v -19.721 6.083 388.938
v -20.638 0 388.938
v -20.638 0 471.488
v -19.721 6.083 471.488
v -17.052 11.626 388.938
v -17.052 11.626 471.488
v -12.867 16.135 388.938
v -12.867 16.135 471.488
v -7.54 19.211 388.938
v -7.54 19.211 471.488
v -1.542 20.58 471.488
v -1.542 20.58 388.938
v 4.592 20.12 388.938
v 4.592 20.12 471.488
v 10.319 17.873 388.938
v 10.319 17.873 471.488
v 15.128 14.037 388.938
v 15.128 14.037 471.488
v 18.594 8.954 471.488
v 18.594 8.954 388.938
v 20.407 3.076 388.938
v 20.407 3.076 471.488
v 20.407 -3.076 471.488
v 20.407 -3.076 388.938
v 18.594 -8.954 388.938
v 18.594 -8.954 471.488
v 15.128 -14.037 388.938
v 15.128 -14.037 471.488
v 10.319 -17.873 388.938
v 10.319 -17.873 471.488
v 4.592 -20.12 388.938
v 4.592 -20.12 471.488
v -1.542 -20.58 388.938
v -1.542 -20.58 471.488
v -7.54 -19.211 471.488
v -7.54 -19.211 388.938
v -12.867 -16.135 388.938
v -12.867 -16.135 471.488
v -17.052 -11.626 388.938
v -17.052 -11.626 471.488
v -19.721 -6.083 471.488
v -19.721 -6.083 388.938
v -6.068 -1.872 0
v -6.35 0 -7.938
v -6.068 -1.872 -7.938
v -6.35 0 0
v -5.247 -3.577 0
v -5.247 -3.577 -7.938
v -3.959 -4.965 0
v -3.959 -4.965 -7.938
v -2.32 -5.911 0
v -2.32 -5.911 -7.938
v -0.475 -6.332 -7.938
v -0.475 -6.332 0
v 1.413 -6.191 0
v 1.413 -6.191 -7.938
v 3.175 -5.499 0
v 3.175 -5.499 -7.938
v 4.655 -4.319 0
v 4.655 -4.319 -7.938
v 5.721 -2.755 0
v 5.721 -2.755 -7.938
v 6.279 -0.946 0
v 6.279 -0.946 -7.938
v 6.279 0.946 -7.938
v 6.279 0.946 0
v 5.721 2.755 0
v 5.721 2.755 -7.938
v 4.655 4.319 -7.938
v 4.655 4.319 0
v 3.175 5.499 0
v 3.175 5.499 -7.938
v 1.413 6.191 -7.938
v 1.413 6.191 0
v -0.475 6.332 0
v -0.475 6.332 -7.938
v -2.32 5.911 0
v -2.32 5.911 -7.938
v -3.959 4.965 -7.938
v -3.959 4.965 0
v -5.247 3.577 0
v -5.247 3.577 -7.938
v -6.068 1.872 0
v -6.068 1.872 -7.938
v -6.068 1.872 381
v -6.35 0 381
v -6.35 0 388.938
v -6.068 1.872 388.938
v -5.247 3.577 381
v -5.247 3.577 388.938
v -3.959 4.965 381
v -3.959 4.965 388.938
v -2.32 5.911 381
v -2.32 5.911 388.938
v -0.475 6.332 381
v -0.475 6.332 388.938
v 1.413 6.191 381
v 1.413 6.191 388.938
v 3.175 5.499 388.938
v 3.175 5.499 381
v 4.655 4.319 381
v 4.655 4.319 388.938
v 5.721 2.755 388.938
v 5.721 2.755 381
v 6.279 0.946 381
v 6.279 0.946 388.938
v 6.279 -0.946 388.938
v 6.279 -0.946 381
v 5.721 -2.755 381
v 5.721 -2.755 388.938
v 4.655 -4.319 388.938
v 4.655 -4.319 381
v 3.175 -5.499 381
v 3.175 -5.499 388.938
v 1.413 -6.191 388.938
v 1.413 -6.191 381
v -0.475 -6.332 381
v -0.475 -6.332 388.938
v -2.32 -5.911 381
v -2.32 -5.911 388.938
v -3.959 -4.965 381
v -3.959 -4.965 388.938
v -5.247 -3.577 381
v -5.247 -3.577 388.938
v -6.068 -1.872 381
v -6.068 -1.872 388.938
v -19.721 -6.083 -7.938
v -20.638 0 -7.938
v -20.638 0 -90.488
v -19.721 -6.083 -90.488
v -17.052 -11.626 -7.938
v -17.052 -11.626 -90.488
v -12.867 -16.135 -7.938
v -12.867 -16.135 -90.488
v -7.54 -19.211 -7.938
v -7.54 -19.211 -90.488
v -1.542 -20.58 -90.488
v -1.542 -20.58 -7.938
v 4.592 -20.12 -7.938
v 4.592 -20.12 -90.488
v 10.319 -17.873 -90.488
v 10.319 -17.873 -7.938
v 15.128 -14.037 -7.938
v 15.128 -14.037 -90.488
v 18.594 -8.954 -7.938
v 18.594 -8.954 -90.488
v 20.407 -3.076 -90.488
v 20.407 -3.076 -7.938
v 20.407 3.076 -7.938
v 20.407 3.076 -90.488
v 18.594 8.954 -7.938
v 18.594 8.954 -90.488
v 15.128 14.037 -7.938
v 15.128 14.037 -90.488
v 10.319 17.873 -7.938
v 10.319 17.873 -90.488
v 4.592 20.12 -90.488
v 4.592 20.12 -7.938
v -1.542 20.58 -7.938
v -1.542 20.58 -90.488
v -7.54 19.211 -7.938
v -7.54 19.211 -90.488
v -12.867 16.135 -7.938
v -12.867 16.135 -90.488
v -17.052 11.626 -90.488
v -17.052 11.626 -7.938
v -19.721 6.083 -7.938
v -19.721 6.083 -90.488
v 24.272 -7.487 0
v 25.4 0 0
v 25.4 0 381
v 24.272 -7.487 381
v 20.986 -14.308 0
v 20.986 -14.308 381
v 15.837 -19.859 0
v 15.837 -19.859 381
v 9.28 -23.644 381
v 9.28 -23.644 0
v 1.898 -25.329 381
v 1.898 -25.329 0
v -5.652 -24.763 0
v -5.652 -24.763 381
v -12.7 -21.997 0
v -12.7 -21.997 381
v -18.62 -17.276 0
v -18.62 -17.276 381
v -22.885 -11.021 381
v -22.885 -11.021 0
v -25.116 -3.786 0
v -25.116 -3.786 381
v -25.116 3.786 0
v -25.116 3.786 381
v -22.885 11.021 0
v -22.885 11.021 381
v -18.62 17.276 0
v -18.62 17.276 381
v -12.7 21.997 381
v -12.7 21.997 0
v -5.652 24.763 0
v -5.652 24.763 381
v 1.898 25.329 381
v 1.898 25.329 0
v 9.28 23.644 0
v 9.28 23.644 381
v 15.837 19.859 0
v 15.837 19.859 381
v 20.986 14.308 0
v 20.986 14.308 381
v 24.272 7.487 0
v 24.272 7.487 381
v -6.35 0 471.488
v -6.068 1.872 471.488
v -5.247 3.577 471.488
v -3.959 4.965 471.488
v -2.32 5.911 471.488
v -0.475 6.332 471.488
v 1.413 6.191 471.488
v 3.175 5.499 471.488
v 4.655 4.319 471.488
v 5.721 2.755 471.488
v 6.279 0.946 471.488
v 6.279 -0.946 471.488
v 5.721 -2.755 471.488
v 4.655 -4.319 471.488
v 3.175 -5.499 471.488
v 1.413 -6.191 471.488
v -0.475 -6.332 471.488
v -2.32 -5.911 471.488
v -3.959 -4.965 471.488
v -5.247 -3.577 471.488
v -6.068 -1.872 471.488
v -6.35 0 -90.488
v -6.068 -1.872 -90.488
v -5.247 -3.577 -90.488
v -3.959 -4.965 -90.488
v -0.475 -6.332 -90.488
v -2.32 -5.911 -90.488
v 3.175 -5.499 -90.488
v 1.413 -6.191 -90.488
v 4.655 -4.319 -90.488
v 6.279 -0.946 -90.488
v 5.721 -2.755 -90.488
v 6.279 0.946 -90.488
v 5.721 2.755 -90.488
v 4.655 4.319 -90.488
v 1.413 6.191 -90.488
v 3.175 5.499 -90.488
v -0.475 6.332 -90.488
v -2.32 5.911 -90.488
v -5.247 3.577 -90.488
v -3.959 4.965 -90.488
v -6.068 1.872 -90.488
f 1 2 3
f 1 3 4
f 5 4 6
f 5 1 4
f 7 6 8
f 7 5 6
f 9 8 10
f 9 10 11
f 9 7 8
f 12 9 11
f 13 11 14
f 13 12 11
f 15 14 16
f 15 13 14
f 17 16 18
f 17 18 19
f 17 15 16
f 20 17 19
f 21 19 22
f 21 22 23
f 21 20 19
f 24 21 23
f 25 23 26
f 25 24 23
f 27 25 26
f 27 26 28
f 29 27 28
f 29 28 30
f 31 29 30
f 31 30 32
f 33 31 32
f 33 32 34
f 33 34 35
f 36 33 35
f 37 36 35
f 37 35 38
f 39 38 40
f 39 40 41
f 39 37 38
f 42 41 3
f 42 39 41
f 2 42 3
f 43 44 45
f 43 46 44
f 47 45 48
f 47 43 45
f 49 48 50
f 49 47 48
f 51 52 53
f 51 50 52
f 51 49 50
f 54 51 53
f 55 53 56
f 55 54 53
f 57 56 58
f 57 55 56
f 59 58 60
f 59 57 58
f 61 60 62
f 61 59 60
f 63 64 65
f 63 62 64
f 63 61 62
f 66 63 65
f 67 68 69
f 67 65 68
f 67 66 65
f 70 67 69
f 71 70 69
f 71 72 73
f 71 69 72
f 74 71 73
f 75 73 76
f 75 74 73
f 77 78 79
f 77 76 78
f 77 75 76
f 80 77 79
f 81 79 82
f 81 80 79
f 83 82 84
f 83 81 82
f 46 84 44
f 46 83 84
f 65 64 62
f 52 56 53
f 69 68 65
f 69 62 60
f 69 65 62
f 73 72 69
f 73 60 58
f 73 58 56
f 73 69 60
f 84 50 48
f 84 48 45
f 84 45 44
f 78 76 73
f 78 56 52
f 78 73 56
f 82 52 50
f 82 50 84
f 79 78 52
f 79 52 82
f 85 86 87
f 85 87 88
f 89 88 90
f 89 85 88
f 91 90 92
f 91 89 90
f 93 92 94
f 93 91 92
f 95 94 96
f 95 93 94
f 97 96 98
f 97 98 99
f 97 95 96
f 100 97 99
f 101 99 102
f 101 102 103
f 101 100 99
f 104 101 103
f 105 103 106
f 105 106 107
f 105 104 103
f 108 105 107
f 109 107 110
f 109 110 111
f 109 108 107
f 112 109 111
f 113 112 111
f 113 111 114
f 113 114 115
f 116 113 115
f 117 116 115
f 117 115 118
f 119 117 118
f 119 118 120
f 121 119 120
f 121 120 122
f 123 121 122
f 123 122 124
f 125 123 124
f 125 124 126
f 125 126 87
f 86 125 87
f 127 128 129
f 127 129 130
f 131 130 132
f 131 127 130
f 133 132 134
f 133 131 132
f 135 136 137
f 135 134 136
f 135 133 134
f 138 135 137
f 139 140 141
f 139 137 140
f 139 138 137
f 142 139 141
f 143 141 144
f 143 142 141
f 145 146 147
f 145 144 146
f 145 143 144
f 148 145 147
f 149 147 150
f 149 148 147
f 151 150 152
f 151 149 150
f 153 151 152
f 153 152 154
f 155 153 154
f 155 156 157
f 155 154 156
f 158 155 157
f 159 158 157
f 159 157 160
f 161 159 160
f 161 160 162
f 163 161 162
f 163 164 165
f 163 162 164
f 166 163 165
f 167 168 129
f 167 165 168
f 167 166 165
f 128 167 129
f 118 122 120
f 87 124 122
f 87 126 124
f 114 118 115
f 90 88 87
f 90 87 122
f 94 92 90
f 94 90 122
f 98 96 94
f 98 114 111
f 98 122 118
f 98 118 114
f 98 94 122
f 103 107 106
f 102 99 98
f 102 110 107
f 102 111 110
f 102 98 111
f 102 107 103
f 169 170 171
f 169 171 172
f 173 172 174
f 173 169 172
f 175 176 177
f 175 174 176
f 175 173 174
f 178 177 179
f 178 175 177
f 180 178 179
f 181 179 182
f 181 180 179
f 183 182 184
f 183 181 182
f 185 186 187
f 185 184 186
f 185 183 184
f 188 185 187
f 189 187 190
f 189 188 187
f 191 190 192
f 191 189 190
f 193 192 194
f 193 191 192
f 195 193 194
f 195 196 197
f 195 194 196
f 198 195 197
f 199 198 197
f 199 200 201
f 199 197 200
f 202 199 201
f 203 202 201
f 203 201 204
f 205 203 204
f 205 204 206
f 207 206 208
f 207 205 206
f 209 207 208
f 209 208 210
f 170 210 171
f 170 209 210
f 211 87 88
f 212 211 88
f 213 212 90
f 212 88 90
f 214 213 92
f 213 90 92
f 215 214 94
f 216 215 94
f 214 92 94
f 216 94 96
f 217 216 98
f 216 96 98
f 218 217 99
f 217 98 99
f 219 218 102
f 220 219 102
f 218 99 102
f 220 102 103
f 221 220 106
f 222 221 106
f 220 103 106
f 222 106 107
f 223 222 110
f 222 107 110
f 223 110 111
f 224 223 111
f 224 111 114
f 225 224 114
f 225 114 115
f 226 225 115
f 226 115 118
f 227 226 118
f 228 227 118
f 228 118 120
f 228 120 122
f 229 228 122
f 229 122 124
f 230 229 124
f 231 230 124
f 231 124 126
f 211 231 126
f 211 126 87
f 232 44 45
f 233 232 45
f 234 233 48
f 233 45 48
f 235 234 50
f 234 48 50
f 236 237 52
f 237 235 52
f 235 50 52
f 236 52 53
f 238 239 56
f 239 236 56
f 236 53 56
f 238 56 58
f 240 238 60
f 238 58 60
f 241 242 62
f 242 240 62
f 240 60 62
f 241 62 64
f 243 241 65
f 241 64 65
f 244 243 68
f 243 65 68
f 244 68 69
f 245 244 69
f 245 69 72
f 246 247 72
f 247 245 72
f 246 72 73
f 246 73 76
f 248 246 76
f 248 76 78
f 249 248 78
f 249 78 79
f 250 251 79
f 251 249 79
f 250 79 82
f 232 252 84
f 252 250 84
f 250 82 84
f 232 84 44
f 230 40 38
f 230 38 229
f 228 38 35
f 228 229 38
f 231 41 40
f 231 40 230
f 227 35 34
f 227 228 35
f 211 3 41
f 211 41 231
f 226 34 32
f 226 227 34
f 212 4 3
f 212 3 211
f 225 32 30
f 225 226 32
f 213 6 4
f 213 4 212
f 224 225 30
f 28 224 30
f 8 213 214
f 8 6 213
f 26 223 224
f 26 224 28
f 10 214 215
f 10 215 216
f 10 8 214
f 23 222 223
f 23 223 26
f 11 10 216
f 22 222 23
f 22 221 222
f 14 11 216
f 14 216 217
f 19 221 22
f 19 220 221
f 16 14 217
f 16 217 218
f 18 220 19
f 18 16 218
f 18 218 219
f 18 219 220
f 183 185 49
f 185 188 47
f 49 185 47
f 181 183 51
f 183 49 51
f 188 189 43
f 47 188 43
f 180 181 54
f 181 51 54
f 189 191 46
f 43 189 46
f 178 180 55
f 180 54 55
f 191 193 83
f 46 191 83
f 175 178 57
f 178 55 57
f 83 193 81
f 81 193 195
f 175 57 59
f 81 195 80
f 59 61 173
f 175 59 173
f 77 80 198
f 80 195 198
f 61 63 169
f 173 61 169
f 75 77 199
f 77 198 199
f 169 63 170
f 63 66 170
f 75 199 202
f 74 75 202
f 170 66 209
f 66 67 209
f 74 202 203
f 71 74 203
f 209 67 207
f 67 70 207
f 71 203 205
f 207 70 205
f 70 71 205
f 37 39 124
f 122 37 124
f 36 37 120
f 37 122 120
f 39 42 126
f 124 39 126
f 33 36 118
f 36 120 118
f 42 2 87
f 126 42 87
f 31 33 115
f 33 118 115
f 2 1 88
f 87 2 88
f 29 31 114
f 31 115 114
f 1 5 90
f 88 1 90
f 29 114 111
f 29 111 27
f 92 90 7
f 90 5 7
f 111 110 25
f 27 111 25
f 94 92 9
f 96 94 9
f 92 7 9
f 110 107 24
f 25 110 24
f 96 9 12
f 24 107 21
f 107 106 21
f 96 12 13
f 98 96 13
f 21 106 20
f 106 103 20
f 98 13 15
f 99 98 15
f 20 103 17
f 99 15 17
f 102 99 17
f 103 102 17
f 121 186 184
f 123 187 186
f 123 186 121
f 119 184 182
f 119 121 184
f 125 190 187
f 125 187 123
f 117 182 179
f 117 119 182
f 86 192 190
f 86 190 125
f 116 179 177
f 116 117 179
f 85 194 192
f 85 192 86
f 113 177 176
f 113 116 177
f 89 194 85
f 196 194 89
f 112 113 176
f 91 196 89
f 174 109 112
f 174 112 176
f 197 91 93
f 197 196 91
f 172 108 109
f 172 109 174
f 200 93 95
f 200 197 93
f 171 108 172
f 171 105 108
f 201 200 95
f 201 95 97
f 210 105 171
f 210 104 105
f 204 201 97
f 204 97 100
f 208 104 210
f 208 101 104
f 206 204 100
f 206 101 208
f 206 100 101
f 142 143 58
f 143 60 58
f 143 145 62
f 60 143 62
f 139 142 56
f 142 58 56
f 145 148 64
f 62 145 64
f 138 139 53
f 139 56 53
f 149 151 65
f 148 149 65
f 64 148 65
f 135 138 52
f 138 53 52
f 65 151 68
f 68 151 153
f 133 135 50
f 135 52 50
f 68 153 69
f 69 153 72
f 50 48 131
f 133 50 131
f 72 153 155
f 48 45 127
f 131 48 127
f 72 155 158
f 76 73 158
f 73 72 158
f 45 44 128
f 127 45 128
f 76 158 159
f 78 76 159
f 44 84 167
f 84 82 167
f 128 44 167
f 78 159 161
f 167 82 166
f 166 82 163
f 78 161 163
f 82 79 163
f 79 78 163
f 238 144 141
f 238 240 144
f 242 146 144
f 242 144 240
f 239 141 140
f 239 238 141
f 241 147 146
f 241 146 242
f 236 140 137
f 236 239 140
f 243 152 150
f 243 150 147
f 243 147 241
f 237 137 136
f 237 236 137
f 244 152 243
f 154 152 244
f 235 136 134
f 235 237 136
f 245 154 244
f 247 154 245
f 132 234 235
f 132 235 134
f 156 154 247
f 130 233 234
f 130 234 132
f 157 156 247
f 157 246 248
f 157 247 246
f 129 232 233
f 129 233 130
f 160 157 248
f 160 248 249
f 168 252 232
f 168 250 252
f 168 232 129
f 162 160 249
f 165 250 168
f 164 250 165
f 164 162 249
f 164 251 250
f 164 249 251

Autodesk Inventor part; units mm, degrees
ref_plane "YZ Plane" through (0, 0, 0) normal (1, 0, 0) x (0, 1, 0)
ref_plane "XZ Plane" through (0, 0, 0) normal (0, 1, 0) x (-1, 0, 0)
sketch "Sketch1" plane through (0, 0, 0) normal (0, 0, 1) x (1, 0, 0)
  circle A0 centre (0, 0) radius 25.4
  dimension "d0" = 50.8
extrude "Extrusion1" add sketch "Sketch1" along normal blind 381
sketch "Sketch2" plane through (0, 0, 0) normal (0, 0, -1) x (-1, 0, 0)
  circle A0 centre (0, 0) radius 6.35
  dimension "d3" = 12.7
extrude "Extrusion2" add sketch "Sketch2" along normal blind 7.9375
sketch "Sketch3" plane through (0, 0, -7.9375) normal (0, 0, -1) x (-1, 0, 0)
  circle A0 centre (0, 0) radius 6.35 projected
  circle A1 centre (0, 0) radius 20.6375
  dimension "d6" = 41.275
extrude "Extrusion3" add sketch "Sketch3" along normal blind 82.55
ref_plane "Work Plane1" through (0, 0, 190.5) normal (0, 0, 1) x (1, 0, 0)
mirror "Mirror1" about plane through (0, 0, 190.5) normal (0, 0, 1) of "Extrusion3", "Extrusion2"
properties part number "shaftThingy"
